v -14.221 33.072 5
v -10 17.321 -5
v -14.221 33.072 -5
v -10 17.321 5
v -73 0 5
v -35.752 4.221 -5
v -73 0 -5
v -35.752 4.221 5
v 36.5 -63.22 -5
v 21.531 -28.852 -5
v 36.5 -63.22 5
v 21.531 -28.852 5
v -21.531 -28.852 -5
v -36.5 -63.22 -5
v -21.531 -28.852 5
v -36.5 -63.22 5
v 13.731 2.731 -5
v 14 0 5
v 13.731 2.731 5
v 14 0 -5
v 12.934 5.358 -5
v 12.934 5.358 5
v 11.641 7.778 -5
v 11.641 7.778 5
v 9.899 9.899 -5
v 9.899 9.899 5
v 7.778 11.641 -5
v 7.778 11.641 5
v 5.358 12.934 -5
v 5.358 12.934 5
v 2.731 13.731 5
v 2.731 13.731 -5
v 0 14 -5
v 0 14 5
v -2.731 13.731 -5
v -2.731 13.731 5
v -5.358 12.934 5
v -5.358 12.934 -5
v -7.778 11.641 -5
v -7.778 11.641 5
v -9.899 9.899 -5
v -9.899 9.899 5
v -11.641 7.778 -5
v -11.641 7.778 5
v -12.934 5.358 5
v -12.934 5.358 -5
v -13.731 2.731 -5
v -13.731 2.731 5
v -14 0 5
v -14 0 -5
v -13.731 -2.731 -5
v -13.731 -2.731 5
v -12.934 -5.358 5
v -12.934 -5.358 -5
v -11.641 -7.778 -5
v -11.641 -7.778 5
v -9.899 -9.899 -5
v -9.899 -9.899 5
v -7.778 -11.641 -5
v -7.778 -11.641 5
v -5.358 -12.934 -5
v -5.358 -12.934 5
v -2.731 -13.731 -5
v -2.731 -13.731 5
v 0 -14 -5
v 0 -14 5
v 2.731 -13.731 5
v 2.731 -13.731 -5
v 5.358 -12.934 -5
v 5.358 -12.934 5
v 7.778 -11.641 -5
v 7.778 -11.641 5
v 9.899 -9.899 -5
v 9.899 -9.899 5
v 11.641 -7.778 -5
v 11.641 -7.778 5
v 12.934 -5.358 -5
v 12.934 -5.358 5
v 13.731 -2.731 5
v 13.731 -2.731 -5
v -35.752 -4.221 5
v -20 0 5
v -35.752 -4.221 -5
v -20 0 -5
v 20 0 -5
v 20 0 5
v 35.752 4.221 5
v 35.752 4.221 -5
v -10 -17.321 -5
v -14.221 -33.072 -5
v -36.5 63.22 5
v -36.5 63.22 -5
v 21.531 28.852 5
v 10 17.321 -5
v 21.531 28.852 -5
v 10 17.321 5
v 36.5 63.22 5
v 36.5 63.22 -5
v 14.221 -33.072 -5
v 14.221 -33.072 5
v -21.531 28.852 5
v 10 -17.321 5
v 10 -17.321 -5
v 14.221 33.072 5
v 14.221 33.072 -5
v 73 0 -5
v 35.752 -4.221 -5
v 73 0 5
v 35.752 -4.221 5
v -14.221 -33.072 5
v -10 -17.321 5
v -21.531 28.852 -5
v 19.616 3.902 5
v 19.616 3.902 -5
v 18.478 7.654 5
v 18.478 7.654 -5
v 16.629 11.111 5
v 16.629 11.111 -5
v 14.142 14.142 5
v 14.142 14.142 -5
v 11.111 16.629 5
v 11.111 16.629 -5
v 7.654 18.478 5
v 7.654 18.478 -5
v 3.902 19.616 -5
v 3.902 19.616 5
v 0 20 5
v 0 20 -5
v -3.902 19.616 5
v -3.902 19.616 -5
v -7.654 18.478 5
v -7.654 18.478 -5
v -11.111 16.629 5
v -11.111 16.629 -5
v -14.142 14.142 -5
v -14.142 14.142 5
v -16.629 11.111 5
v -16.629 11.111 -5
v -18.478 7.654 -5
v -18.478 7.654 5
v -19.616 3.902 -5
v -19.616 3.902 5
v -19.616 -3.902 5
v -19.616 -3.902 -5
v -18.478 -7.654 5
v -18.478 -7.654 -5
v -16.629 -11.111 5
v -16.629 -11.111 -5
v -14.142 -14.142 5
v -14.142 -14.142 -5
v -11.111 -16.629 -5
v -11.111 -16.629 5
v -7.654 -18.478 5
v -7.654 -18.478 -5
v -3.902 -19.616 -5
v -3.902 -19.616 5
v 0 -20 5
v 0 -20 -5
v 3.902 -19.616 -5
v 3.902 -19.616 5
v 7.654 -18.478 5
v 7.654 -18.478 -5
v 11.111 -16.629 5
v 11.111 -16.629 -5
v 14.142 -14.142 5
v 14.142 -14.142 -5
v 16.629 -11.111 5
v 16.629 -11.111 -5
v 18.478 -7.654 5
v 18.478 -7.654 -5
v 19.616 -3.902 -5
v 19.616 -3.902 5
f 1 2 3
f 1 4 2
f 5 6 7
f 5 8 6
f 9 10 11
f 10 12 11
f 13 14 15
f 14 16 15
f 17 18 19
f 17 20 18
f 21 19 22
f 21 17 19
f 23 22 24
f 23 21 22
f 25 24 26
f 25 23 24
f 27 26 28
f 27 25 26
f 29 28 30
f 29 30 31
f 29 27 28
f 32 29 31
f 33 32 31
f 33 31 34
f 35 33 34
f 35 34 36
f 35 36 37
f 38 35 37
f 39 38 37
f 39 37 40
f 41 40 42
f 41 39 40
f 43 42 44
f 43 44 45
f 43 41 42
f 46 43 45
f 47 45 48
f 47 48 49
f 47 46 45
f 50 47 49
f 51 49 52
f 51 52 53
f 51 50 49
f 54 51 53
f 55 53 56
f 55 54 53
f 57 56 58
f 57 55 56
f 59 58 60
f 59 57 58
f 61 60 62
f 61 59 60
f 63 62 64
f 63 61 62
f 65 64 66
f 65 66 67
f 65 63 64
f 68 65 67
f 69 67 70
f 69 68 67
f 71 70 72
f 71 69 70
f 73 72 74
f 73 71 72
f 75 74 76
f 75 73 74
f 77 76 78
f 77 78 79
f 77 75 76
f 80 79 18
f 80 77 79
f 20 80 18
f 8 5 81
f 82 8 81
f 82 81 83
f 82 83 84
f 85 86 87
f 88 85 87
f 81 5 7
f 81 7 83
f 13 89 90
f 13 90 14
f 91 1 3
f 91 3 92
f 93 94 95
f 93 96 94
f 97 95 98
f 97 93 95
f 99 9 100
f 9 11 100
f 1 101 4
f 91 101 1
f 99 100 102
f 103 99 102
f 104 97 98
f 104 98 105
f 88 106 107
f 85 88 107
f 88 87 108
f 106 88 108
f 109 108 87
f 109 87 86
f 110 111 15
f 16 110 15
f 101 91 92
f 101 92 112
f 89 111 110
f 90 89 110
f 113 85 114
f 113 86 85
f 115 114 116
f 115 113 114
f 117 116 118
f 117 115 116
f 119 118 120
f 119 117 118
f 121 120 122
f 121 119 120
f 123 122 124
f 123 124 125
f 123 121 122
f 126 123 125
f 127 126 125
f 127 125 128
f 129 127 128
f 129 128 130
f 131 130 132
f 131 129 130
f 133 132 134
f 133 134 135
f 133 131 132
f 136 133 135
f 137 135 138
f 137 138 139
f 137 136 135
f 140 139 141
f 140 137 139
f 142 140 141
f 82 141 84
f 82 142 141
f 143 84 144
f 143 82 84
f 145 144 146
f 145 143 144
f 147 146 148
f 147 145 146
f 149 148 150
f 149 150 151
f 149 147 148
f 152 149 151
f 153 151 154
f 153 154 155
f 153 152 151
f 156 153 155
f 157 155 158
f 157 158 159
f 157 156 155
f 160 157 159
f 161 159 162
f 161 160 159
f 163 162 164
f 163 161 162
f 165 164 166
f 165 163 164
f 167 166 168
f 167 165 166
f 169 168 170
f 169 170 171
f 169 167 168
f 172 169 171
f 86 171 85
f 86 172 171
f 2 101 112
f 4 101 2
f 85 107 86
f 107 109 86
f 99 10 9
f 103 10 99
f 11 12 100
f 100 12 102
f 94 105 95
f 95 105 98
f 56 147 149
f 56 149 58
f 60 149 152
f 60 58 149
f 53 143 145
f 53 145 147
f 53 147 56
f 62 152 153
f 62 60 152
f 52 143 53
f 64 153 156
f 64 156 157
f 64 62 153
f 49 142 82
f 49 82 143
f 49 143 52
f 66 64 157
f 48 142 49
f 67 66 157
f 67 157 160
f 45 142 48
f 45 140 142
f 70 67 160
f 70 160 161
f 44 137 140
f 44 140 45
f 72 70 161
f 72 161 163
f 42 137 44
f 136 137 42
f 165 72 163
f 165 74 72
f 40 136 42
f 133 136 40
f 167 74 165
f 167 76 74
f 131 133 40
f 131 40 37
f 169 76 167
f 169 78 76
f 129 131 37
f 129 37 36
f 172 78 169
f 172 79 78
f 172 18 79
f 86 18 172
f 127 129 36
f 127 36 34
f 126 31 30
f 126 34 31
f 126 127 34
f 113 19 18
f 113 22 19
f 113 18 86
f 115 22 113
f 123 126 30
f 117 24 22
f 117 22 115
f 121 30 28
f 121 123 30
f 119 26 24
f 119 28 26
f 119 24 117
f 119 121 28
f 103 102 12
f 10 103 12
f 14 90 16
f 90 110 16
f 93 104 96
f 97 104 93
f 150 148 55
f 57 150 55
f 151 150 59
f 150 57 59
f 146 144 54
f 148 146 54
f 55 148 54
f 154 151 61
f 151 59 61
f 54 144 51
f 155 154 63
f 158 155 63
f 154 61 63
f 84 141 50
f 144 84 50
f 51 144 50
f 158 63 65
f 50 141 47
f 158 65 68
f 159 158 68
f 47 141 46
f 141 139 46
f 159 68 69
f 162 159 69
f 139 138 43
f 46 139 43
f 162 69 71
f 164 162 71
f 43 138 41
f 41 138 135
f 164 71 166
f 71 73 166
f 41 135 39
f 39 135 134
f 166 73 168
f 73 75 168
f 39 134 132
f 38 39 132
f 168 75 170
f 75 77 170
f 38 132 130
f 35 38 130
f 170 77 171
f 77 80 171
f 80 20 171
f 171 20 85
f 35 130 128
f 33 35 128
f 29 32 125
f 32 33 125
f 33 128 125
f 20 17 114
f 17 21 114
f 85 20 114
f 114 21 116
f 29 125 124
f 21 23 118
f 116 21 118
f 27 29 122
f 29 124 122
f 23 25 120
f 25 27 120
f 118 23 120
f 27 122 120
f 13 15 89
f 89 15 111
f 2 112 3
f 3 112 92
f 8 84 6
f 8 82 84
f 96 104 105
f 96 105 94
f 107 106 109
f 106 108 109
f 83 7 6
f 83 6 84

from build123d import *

# Parameters (mm, degrees)
SKETCH1_R             = 20
SKETCH1_R_2           = 14
BOSS_EXTRUDE1_DEPTH   = 5
BOSS_EXTRUDE1_2_DEPTH = 5
BOSS_EXTRUDE1_3_DEPTH = 5
BOSS_EXTRUDE1_4_DEPTH = 5
BOSS_EXTRUDE1_5_DEPTH = 5
BOSS_EXTRUDE1_6_DEPTH = 5
BOSS_EXTRUDE1_7_DEPTH = 5


with BuildPart() as part:
    # Sketch1 → Boss-Extrude1 (new, symmetric)
    with BuildSketch(Plane.XY):
        Circle(SKETCH1_R)
        Circle(SKETCH1_R_2, mode=Mode.SUBTRACT)
    extrude(amount=BOSS_EXTRUDE1_DEPTH, both=True)


with BuildPart() as body_2:
    # Sketch1 → Boss-Extrude1 2 (new, symmetric)
    with BuildSketch(Plane.XY):
        Polygon((-10, -17.320508076), (-14.220662617, -33.072235406), (-36.5, -63.219854476), (-21.531064712, -28.851572788), align=None)
    extrude(amount=BOSS_EXTRUDE1_2_DEPTH, both=True)


with BuildPart() as body_3:
    # Sketch1 → Boss-Extrude1 3 (new, symmetric)
    with BuildSketch(Plane.XY):
        Polygon((10, -17.320508076), (21.531064712, -28.851572788), (36.5, -63.219854476), (14.220662617, -33.072235406), align=None)
    extrude(amount=BOSS_EXTRUDE1_3_DEPTH, both=True)


with BuildPart() as body_4:
    # Sketch1 → Boss-Extrude1 4 (new, symmetric)
    with BuildSketch(Plane.XY):
        Polygon((-10, 17.320508076), (-14.220662617, 33.072235406), (-36.5, 63.219854476), (-21.531064712, 28.851572788), align=None)
    extrude(amount=BOSS_EXTRUDE1_4_DEPTH, both=True)


with BuildPart() as body_5:
    # Sketch1 → Boss-Extrude1 5 (new, symmetric)
    with BuildSketch(Plane.XY):
        Polygon((-35.75172733, 4.220662617), (-73, 0), (-35.75172733, -4.220662617), (-20, 0), align=None)
    extrude(amount=BOSS_EXTRUDE1_5_DEPTH, both=True)


with BuildPart() as body_6:
    # Sketch1 → Boss-Extrude1 6 (new, symmetric)
    with BuildSketch(Plane.XY):
        Polygon((35.75172733, 4.220662617), (73, 0), (35.75172733, -4.220662617), (20, 0), align=None)
    extrude(amount=BOSS_EXTRUDE1_6_DEPTH, both=True)


with BuildPart() as body_7:
    # Sketch1 → Boss-Extrude1 7 (new, symmetric)
    with BuildSketch(Plane.XY):
        Polygon((21.531064712, 28.851572788), (36.5, 63.219854476), (14.220662617, 33.072235406), (10, 17.320508076), align=None)
    extrude(amount=BOSS_EXTRUDE1_7_DEPTH, both=True)


solid = Compound([part.part, body_2.part, body_3.part, body_4.part, body_5.part, body_6.part, body_7.part])
